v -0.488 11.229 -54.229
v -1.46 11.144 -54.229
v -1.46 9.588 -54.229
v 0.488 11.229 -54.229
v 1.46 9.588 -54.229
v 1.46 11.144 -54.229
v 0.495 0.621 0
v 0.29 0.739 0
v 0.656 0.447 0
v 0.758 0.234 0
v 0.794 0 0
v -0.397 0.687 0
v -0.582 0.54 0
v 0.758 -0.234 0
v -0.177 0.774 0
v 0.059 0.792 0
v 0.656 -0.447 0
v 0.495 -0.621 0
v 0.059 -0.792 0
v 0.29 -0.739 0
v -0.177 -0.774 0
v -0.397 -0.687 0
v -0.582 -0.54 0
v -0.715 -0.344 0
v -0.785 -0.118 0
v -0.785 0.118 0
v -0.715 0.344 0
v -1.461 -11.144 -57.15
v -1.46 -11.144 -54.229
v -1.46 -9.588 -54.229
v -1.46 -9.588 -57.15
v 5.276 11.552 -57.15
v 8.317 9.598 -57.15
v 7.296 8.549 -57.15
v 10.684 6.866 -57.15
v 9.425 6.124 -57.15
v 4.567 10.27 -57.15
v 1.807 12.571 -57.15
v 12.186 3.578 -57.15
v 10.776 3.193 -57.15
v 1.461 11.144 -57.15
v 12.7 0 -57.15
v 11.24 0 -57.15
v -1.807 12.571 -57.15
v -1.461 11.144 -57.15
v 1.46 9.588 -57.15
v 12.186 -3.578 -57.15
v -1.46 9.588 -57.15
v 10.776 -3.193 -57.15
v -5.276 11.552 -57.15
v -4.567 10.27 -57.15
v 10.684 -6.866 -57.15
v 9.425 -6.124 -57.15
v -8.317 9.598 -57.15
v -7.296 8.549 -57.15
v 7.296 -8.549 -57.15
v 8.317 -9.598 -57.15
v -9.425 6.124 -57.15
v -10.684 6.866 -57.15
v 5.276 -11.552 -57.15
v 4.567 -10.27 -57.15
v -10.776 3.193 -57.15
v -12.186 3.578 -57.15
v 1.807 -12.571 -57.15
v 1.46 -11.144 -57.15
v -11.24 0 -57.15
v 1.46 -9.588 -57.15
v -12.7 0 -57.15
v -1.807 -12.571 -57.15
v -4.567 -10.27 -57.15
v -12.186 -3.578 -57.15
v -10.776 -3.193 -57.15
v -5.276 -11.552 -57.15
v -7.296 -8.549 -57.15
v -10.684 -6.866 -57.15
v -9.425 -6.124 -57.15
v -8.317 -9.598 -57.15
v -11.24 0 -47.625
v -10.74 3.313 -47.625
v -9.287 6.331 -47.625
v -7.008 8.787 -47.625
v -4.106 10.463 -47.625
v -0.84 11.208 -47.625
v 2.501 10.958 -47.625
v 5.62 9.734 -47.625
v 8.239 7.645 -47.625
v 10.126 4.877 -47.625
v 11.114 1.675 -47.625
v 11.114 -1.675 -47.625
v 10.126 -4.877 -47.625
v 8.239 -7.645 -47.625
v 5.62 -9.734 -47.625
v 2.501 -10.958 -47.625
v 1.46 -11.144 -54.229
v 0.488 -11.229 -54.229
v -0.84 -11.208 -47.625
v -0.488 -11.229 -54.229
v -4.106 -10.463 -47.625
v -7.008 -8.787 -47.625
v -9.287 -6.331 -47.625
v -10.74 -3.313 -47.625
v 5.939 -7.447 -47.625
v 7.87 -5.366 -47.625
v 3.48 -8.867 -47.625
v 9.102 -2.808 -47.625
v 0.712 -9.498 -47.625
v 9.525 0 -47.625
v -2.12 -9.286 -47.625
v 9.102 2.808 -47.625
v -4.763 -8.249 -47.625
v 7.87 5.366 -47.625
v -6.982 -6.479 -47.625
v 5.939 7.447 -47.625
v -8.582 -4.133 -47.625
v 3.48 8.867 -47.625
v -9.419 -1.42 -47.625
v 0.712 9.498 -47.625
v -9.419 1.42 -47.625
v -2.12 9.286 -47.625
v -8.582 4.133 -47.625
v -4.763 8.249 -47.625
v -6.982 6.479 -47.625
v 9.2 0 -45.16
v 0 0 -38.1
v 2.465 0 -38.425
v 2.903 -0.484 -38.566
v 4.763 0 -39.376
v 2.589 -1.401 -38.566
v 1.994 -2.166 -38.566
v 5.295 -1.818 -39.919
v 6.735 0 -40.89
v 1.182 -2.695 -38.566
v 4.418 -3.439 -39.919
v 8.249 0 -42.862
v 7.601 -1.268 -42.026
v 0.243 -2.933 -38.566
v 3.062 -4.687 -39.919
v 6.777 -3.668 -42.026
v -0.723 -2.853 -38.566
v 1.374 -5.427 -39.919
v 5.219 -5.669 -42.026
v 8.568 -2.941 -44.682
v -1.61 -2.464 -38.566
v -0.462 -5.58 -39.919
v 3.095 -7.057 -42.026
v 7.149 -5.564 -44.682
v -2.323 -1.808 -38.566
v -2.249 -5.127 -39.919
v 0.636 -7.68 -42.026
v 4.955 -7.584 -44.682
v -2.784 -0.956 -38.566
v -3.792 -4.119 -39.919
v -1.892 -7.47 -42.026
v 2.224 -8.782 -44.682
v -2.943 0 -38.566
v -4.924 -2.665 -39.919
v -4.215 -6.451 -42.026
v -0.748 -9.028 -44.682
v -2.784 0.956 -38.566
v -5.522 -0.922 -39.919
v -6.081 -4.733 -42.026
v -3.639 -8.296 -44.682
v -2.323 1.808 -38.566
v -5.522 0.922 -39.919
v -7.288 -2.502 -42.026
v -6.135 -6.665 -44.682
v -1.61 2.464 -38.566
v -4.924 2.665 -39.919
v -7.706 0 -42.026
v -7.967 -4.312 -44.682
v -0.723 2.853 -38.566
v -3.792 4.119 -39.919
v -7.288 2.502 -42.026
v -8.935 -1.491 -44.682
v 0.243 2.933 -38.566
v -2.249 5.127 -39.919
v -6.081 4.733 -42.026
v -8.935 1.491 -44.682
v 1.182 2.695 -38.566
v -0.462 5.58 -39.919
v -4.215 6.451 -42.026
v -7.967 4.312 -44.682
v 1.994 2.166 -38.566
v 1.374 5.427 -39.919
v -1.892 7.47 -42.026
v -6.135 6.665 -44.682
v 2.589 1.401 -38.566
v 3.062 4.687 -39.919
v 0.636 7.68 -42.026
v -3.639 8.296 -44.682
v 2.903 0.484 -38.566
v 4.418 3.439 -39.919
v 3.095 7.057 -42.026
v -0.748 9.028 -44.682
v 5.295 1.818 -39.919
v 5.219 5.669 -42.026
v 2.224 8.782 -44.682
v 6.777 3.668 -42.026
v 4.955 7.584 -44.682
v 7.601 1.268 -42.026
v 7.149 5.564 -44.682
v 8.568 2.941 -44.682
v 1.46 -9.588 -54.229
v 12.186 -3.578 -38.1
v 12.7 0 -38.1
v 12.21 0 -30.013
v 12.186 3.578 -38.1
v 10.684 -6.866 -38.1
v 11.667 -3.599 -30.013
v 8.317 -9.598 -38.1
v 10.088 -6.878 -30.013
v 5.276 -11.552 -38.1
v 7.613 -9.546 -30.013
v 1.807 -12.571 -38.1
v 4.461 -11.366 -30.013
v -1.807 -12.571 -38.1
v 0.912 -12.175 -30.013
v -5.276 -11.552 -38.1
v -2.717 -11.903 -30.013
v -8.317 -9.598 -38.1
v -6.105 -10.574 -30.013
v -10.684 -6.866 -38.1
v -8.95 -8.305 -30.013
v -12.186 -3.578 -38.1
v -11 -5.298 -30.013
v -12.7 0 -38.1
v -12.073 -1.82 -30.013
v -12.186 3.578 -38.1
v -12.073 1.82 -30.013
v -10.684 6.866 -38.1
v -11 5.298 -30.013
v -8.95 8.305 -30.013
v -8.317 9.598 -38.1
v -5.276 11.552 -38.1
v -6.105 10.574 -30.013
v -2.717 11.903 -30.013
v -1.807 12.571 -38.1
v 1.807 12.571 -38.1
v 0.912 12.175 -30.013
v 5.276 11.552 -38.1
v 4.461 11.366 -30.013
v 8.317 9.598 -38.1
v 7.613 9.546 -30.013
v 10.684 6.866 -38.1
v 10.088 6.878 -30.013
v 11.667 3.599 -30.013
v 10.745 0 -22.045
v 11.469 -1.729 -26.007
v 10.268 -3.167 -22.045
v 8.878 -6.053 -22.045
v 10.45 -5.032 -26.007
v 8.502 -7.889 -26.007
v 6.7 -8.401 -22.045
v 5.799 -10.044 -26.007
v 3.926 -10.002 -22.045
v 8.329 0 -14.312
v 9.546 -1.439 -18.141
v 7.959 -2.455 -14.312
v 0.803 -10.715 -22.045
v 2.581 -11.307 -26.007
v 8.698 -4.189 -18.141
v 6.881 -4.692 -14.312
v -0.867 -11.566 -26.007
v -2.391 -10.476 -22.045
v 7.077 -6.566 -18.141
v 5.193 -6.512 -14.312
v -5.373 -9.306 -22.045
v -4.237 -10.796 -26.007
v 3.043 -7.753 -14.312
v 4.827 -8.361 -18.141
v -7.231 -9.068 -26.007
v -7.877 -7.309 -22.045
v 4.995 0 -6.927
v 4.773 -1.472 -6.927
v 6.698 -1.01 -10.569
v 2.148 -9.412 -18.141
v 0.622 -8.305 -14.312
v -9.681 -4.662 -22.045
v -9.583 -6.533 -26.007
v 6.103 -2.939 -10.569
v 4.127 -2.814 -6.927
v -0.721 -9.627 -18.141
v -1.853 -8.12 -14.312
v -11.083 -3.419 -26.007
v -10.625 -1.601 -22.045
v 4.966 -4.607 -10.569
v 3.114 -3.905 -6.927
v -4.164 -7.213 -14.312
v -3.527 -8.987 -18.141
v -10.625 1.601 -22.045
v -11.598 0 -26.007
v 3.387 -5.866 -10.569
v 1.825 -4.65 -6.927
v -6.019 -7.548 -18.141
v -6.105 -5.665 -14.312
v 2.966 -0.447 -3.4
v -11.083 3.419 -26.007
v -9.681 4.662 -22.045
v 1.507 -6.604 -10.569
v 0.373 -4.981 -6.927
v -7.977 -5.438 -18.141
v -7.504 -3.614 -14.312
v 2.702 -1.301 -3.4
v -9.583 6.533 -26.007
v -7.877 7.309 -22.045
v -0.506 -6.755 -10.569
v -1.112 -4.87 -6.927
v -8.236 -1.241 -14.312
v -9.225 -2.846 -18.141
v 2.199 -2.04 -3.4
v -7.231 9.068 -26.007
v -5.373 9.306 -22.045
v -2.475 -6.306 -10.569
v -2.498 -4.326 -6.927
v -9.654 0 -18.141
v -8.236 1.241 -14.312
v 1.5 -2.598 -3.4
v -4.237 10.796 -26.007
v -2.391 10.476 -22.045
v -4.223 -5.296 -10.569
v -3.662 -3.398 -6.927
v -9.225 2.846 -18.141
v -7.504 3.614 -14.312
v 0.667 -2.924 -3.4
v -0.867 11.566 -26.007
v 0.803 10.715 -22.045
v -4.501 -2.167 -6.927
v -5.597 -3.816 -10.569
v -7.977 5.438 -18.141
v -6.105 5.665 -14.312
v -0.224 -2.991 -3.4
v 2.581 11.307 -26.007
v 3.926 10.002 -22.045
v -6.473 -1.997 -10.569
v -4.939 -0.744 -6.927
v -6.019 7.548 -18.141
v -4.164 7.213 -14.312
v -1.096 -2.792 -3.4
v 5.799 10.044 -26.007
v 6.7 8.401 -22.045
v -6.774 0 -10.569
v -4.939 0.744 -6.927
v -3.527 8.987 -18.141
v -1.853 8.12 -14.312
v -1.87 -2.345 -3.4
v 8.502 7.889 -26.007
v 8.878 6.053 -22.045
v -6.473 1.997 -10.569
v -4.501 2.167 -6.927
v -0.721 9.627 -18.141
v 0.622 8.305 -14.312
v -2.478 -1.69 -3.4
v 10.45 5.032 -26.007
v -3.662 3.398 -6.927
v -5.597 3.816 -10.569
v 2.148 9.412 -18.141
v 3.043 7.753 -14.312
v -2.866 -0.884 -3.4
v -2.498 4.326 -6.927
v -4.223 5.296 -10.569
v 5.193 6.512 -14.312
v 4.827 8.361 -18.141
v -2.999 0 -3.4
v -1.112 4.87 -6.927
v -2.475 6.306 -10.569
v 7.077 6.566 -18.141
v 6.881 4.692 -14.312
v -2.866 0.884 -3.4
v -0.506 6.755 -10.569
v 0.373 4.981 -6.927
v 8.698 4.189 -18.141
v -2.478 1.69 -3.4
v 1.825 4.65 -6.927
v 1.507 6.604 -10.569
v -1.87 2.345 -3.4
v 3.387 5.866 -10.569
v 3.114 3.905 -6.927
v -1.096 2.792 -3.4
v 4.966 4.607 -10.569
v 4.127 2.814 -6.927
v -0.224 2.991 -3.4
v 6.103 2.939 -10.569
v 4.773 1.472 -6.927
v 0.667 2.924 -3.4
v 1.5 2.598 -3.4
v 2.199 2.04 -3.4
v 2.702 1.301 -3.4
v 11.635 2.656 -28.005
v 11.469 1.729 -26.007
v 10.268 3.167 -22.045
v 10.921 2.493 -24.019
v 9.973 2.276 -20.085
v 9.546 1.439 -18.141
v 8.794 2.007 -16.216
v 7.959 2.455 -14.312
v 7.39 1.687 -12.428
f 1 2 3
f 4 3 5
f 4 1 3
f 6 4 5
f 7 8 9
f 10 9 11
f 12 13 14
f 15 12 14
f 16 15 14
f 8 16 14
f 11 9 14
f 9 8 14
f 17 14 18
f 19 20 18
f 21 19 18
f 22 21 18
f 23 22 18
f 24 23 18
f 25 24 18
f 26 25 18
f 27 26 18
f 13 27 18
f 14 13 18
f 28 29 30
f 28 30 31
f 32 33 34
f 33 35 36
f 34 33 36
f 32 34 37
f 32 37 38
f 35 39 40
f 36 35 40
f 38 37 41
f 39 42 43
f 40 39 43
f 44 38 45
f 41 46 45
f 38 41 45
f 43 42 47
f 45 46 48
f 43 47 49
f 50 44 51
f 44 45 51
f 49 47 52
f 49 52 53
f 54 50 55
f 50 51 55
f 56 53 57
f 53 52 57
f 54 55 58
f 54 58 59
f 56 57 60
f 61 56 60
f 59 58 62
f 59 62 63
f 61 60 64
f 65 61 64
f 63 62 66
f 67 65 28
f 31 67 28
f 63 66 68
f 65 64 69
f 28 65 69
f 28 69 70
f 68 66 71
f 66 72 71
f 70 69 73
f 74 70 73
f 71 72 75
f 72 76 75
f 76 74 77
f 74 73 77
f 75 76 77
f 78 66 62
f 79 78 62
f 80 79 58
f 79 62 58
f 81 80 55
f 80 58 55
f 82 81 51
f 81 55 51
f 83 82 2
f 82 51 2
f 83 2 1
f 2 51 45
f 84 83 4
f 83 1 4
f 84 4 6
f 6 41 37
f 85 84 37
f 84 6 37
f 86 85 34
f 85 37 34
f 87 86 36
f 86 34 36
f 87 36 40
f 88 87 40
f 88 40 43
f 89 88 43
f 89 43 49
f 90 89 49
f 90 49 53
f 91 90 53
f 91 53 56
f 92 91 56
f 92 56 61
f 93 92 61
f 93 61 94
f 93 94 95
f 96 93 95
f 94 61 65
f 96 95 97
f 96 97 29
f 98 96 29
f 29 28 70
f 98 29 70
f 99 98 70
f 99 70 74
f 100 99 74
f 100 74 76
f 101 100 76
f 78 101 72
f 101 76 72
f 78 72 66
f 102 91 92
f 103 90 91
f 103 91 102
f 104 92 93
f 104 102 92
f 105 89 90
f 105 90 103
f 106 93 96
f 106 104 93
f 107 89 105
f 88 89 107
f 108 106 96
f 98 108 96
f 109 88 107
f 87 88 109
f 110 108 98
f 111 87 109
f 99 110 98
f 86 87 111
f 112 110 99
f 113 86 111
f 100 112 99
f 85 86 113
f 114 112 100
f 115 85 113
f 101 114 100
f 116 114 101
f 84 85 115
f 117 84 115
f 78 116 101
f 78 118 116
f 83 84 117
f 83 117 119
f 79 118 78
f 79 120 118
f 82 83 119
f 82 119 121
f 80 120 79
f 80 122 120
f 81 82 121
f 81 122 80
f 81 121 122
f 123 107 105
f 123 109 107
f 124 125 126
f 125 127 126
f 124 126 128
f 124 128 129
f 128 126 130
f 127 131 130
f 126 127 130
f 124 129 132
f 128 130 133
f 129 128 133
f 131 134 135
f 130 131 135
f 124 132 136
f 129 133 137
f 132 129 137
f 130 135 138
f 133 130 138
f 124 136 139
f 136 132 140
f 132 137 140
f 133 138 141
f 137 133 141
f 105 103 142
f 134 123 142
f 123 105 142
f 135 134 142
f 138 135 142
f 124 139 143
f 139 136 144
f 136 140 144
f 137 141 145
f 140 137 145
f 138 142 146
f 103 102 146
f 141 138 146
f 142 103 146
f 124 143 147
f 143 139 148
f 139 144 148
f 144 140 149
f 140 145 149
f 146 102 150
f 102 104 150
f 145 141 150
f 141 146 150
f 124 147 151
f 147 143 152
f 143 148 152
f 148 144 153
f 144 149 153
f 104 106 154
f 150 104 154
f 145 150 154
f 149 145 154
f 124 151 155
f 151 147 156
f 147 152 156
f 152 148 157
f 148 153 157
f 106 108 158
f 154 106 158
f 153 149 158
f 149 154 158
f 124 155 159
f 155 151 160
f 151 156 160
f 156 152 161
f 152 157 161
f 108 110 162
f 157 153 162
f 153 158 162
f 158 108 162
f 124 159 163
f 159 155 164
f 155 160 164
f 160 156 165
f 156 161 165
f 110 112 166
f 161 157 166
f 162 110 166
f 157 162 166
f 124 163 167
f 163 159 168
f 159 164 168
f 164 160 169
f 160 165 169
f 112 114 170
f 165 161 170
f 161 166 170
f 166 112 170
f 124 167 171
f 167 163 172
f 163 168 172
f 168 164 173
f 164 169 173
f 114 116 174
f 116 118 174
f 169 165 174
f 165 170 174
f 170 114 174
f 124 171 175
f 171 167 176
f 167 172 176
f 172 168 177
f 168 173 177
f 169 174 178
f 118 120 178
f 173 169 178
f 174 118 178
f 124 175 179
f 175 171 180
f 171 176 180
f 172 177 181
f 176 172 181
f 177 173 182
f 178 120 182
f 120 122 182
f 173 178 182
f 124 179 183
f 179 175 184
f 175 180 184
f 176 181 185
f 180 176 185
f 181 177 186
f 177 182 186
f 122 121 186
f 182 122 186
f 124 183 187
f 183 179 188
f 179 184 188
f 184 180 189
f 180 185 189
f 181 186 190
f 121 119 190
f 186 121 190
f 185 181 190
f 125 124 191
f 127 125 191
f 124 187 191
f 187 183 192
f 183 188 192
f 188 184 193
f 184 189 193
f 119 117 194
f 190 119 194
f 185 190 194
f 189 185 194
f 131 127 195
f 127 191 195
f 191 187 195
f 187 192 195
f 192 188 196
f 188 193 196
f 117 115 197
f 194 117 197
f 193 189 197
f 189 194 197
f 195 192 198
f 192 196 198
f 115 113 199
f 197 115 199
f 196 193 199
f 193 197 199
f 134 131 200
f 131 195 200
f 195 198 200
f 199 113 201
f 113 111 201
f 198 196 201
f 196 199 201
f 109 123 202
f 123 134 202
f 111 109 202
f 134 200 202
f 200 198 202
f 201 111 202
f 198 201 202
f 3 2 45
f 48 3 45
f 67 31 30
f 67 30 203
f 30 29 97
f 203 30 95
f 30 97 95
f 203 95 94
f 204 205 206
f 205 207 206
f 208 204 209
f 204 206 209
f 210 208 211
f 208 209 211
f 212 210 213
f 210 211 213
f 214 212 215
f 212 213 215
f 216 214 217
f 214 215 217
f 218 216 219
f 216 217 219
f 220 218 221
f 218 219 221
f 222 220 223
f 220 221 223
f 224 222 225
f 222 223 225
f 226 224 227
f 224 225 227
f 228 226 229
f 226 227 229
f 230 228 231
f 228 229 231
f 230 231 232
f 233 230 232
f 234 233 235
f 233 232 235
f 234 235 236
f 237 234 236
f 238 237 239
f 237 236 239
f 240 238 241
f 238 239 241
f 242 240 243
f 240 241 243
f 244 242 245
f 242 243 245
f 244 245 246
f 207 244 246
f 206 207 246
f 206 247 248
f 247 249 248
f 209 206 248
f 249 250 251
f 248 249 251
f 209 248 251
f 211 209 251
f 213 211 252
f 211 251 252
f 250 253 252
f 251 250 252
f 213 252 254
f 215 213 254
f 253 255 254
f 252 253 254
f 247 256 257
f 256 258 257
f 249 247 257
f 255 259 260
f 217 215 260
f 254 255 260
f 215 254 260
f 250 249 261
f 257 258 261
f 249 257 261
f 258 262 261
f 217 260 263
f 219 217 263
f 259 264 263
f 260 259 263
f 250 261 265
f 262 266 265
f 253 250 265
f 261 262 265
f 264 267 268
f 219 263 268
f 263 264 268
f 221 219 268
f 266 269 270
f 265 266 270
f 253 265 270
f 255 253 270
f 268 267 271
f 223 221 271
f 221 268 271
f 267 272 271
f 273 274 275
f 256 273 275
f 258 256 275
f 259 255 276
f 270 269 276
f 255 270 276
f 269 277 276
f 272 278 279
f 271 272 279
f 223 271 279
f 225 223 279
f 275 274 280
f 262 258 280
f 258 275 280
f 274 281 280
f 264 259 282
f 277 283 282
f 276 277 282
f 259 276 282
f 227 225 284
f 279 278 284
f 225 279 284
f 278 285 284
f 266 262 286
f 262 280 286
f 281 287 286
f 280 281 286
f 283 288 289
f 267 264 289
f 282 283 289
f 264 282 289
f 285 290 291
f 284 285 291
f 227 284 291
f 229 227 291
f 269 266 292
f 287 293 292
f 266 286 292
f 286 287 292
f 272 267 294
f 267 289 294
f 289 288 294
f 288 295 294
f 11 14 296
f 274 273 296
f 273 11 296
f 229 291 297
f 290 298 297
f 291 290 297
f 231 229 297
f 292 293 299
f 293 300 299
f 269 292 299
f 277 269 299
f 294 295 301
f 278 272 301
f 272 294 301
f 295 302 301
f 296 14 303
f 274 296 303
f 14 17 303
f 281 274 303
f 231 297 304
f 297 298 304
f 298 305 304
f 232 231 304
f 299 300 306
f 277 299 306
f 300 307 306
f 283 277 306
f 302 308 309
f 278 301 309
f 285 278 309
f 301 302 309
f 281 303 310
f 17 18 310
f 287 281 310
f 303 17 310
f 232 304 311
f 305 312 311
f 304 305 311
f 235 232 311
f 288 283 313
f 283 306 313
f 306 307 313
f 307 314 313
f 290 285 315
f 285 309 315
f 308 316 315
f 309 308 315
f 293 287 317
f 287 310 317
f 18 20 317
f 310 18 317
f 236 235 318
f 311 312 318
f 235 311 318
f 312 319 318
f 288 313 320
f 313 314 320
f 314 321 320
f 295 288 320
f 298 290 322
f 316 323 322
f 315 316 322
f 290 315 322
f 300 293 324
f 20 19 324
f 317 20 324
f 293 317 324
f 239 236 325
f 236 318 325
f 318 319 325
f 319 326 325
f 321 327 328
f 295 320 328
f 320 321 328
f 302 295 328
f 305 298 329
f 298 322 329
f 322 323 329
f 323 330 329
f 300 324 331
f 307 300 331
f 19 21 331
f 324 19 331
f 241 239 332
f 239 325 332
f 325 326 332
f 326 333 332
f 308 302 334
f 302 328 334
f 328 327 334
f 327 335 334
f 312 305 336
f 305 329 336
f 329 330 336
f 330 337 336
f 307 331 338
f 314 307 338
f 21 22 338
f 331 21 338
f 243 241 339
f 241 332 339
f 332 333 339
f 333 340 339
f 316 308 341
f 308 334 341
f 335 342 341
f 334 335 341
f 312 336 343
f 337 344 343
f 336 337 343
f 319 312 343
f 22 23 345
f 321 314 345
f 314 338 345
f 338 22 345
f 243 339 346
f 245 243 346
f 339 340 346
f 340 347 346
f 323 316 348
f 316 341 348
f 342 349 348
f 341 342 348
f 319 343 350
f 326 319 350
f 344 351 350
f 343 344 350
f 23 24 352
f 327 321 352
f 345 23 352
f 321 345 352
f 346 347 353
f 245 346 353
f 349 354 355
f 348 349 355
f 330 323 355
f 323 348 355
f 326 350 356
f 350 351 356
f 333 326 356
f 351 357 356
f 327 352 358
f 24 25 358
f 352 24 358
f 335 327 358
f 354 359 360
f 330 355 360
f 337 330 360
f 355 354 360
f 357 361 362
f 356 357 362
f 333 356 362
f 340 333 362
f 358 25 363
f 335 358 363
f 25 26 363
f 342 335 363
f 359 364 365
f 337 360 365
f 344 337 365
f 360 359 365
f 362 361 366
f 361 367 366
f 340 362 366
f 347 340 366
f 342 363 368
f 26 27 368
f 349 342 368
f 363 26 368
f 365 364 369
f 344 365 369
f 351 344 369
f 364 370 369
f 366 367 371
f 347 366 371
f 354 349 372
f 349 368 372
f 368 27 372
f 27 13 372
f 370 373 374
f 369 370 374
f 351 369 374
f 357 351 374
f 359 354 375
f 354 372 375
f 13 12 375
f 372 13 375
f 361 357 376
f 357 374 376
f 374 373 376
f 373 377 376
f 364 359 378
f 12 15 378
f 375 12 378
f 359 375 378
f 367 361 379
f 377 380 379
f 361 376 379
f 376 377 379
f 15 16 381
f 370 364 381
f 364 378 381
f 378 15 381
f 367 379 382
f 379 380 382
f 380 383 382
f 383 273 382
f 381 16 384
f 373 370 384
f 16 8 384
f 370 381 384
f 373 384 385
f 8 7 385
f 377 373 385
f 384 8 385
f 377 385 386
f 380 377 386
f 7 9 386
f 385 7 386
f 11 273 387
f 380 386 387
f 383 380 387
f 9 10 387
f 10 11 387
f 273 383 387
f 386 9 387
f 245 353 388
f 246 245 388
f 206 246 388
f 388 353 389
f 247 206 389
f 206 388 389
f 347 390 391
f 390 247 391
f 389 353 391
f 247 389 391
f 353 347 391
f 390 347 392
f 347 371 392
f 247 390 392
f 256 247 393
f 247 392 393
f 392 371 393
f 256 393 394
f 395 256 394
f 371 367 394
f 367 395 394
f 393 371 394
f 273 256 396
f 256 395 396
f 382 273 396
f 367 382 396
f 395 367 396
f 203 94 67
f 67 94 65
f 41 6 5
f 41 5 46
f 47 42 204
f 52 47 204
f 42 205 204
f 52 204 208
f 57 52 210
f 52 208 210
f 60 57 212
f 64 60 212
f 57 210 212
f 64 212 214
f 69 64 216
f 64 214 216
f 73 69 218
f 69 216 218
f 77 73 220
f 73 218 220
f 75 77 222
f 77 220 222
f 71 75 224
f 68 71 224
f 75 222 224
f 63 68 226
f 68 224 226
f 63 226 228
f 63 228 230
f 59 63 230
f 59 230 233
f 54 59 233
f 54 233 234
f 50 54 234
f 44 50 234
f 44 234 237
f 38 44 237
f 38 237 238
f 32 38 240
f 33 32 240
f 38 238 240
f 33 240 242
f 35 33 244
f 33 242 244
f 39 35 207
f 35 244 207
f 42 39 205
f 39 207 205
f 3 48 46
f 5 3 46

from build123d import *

# Parameters (mm, degrees)
SKETCH4_R           = 11.2395
CUT_EXTRUDE1_DEPTH  = 9.525
SKETCH5_W           = 2.921
SKETCH5_H           = 2.921
BOSS_EXTRUDE1_DEPTH = 1.8415


with BuildPart() as part:
    # Sketch3 → Revolve2 (revolve)
    with BuildSketch(Plane(origin=(0, 0, 0), x_dir=(0, 0, -1), z_dir=(1, 0, 0)), mode=Mode.PRIVATE) as revolve2_sk:
        with BuildLine():
            Line((0, 0), (38.1, 0))
            ThreePointArc((38.1, 0), (40.889807909, 6.735192091), (47.625, 9.525))
            Line((47.625, 9.525), (57.15, 9.525))
            Line((57.15, 9.525), (57.15, 12.7))
            Line((57.15, 12.7), (38.1, 12.7))
            ThreePointArc((38.1, 12.7), (18.1414881, 9.65411308), (0, 0.79375))
            Line((0, 0.79375), (0, 0))
        make_face()
    revolve(revolve2_sk.sketch.rotate(Axis((0, 0, 0), (0, 0, -1)), 90), axis=Axis((0, 0, 0), (0, 0, -1)))

    # Sketch4 → Cut-Extrude1 (cut)
    with BuildSketch(Plane(origin=(0, 0, -57.15), x_dir=(-1, 0, 0), z_dir=(0, 0, -1))):
        Circle(SKETCH4_R)
    extrude(amount=-CUT_EXTRUDE1_DEPTH, mode=Mode.SUBTRACT)

    # Sketch5 → Boss-Extrude1 (add)
    with BuildSketch(Plane(origin=(0, 11.43, 0), x_dir=(1, 0, 0), z_dir=(0, 1, 0))):
        with Locations((0, 55.6895)):
            Rectangle(SKETCH5_W, SKETCH5_H)
    boss_extrude1 = extrude(amount=-BOSS_EXTRUDE1_DEPTH)

    # Mirror1: Boss-Extrude1 across plane
    add(boss_extrude1.mirror(Plane.ZX))


solid = part.part
